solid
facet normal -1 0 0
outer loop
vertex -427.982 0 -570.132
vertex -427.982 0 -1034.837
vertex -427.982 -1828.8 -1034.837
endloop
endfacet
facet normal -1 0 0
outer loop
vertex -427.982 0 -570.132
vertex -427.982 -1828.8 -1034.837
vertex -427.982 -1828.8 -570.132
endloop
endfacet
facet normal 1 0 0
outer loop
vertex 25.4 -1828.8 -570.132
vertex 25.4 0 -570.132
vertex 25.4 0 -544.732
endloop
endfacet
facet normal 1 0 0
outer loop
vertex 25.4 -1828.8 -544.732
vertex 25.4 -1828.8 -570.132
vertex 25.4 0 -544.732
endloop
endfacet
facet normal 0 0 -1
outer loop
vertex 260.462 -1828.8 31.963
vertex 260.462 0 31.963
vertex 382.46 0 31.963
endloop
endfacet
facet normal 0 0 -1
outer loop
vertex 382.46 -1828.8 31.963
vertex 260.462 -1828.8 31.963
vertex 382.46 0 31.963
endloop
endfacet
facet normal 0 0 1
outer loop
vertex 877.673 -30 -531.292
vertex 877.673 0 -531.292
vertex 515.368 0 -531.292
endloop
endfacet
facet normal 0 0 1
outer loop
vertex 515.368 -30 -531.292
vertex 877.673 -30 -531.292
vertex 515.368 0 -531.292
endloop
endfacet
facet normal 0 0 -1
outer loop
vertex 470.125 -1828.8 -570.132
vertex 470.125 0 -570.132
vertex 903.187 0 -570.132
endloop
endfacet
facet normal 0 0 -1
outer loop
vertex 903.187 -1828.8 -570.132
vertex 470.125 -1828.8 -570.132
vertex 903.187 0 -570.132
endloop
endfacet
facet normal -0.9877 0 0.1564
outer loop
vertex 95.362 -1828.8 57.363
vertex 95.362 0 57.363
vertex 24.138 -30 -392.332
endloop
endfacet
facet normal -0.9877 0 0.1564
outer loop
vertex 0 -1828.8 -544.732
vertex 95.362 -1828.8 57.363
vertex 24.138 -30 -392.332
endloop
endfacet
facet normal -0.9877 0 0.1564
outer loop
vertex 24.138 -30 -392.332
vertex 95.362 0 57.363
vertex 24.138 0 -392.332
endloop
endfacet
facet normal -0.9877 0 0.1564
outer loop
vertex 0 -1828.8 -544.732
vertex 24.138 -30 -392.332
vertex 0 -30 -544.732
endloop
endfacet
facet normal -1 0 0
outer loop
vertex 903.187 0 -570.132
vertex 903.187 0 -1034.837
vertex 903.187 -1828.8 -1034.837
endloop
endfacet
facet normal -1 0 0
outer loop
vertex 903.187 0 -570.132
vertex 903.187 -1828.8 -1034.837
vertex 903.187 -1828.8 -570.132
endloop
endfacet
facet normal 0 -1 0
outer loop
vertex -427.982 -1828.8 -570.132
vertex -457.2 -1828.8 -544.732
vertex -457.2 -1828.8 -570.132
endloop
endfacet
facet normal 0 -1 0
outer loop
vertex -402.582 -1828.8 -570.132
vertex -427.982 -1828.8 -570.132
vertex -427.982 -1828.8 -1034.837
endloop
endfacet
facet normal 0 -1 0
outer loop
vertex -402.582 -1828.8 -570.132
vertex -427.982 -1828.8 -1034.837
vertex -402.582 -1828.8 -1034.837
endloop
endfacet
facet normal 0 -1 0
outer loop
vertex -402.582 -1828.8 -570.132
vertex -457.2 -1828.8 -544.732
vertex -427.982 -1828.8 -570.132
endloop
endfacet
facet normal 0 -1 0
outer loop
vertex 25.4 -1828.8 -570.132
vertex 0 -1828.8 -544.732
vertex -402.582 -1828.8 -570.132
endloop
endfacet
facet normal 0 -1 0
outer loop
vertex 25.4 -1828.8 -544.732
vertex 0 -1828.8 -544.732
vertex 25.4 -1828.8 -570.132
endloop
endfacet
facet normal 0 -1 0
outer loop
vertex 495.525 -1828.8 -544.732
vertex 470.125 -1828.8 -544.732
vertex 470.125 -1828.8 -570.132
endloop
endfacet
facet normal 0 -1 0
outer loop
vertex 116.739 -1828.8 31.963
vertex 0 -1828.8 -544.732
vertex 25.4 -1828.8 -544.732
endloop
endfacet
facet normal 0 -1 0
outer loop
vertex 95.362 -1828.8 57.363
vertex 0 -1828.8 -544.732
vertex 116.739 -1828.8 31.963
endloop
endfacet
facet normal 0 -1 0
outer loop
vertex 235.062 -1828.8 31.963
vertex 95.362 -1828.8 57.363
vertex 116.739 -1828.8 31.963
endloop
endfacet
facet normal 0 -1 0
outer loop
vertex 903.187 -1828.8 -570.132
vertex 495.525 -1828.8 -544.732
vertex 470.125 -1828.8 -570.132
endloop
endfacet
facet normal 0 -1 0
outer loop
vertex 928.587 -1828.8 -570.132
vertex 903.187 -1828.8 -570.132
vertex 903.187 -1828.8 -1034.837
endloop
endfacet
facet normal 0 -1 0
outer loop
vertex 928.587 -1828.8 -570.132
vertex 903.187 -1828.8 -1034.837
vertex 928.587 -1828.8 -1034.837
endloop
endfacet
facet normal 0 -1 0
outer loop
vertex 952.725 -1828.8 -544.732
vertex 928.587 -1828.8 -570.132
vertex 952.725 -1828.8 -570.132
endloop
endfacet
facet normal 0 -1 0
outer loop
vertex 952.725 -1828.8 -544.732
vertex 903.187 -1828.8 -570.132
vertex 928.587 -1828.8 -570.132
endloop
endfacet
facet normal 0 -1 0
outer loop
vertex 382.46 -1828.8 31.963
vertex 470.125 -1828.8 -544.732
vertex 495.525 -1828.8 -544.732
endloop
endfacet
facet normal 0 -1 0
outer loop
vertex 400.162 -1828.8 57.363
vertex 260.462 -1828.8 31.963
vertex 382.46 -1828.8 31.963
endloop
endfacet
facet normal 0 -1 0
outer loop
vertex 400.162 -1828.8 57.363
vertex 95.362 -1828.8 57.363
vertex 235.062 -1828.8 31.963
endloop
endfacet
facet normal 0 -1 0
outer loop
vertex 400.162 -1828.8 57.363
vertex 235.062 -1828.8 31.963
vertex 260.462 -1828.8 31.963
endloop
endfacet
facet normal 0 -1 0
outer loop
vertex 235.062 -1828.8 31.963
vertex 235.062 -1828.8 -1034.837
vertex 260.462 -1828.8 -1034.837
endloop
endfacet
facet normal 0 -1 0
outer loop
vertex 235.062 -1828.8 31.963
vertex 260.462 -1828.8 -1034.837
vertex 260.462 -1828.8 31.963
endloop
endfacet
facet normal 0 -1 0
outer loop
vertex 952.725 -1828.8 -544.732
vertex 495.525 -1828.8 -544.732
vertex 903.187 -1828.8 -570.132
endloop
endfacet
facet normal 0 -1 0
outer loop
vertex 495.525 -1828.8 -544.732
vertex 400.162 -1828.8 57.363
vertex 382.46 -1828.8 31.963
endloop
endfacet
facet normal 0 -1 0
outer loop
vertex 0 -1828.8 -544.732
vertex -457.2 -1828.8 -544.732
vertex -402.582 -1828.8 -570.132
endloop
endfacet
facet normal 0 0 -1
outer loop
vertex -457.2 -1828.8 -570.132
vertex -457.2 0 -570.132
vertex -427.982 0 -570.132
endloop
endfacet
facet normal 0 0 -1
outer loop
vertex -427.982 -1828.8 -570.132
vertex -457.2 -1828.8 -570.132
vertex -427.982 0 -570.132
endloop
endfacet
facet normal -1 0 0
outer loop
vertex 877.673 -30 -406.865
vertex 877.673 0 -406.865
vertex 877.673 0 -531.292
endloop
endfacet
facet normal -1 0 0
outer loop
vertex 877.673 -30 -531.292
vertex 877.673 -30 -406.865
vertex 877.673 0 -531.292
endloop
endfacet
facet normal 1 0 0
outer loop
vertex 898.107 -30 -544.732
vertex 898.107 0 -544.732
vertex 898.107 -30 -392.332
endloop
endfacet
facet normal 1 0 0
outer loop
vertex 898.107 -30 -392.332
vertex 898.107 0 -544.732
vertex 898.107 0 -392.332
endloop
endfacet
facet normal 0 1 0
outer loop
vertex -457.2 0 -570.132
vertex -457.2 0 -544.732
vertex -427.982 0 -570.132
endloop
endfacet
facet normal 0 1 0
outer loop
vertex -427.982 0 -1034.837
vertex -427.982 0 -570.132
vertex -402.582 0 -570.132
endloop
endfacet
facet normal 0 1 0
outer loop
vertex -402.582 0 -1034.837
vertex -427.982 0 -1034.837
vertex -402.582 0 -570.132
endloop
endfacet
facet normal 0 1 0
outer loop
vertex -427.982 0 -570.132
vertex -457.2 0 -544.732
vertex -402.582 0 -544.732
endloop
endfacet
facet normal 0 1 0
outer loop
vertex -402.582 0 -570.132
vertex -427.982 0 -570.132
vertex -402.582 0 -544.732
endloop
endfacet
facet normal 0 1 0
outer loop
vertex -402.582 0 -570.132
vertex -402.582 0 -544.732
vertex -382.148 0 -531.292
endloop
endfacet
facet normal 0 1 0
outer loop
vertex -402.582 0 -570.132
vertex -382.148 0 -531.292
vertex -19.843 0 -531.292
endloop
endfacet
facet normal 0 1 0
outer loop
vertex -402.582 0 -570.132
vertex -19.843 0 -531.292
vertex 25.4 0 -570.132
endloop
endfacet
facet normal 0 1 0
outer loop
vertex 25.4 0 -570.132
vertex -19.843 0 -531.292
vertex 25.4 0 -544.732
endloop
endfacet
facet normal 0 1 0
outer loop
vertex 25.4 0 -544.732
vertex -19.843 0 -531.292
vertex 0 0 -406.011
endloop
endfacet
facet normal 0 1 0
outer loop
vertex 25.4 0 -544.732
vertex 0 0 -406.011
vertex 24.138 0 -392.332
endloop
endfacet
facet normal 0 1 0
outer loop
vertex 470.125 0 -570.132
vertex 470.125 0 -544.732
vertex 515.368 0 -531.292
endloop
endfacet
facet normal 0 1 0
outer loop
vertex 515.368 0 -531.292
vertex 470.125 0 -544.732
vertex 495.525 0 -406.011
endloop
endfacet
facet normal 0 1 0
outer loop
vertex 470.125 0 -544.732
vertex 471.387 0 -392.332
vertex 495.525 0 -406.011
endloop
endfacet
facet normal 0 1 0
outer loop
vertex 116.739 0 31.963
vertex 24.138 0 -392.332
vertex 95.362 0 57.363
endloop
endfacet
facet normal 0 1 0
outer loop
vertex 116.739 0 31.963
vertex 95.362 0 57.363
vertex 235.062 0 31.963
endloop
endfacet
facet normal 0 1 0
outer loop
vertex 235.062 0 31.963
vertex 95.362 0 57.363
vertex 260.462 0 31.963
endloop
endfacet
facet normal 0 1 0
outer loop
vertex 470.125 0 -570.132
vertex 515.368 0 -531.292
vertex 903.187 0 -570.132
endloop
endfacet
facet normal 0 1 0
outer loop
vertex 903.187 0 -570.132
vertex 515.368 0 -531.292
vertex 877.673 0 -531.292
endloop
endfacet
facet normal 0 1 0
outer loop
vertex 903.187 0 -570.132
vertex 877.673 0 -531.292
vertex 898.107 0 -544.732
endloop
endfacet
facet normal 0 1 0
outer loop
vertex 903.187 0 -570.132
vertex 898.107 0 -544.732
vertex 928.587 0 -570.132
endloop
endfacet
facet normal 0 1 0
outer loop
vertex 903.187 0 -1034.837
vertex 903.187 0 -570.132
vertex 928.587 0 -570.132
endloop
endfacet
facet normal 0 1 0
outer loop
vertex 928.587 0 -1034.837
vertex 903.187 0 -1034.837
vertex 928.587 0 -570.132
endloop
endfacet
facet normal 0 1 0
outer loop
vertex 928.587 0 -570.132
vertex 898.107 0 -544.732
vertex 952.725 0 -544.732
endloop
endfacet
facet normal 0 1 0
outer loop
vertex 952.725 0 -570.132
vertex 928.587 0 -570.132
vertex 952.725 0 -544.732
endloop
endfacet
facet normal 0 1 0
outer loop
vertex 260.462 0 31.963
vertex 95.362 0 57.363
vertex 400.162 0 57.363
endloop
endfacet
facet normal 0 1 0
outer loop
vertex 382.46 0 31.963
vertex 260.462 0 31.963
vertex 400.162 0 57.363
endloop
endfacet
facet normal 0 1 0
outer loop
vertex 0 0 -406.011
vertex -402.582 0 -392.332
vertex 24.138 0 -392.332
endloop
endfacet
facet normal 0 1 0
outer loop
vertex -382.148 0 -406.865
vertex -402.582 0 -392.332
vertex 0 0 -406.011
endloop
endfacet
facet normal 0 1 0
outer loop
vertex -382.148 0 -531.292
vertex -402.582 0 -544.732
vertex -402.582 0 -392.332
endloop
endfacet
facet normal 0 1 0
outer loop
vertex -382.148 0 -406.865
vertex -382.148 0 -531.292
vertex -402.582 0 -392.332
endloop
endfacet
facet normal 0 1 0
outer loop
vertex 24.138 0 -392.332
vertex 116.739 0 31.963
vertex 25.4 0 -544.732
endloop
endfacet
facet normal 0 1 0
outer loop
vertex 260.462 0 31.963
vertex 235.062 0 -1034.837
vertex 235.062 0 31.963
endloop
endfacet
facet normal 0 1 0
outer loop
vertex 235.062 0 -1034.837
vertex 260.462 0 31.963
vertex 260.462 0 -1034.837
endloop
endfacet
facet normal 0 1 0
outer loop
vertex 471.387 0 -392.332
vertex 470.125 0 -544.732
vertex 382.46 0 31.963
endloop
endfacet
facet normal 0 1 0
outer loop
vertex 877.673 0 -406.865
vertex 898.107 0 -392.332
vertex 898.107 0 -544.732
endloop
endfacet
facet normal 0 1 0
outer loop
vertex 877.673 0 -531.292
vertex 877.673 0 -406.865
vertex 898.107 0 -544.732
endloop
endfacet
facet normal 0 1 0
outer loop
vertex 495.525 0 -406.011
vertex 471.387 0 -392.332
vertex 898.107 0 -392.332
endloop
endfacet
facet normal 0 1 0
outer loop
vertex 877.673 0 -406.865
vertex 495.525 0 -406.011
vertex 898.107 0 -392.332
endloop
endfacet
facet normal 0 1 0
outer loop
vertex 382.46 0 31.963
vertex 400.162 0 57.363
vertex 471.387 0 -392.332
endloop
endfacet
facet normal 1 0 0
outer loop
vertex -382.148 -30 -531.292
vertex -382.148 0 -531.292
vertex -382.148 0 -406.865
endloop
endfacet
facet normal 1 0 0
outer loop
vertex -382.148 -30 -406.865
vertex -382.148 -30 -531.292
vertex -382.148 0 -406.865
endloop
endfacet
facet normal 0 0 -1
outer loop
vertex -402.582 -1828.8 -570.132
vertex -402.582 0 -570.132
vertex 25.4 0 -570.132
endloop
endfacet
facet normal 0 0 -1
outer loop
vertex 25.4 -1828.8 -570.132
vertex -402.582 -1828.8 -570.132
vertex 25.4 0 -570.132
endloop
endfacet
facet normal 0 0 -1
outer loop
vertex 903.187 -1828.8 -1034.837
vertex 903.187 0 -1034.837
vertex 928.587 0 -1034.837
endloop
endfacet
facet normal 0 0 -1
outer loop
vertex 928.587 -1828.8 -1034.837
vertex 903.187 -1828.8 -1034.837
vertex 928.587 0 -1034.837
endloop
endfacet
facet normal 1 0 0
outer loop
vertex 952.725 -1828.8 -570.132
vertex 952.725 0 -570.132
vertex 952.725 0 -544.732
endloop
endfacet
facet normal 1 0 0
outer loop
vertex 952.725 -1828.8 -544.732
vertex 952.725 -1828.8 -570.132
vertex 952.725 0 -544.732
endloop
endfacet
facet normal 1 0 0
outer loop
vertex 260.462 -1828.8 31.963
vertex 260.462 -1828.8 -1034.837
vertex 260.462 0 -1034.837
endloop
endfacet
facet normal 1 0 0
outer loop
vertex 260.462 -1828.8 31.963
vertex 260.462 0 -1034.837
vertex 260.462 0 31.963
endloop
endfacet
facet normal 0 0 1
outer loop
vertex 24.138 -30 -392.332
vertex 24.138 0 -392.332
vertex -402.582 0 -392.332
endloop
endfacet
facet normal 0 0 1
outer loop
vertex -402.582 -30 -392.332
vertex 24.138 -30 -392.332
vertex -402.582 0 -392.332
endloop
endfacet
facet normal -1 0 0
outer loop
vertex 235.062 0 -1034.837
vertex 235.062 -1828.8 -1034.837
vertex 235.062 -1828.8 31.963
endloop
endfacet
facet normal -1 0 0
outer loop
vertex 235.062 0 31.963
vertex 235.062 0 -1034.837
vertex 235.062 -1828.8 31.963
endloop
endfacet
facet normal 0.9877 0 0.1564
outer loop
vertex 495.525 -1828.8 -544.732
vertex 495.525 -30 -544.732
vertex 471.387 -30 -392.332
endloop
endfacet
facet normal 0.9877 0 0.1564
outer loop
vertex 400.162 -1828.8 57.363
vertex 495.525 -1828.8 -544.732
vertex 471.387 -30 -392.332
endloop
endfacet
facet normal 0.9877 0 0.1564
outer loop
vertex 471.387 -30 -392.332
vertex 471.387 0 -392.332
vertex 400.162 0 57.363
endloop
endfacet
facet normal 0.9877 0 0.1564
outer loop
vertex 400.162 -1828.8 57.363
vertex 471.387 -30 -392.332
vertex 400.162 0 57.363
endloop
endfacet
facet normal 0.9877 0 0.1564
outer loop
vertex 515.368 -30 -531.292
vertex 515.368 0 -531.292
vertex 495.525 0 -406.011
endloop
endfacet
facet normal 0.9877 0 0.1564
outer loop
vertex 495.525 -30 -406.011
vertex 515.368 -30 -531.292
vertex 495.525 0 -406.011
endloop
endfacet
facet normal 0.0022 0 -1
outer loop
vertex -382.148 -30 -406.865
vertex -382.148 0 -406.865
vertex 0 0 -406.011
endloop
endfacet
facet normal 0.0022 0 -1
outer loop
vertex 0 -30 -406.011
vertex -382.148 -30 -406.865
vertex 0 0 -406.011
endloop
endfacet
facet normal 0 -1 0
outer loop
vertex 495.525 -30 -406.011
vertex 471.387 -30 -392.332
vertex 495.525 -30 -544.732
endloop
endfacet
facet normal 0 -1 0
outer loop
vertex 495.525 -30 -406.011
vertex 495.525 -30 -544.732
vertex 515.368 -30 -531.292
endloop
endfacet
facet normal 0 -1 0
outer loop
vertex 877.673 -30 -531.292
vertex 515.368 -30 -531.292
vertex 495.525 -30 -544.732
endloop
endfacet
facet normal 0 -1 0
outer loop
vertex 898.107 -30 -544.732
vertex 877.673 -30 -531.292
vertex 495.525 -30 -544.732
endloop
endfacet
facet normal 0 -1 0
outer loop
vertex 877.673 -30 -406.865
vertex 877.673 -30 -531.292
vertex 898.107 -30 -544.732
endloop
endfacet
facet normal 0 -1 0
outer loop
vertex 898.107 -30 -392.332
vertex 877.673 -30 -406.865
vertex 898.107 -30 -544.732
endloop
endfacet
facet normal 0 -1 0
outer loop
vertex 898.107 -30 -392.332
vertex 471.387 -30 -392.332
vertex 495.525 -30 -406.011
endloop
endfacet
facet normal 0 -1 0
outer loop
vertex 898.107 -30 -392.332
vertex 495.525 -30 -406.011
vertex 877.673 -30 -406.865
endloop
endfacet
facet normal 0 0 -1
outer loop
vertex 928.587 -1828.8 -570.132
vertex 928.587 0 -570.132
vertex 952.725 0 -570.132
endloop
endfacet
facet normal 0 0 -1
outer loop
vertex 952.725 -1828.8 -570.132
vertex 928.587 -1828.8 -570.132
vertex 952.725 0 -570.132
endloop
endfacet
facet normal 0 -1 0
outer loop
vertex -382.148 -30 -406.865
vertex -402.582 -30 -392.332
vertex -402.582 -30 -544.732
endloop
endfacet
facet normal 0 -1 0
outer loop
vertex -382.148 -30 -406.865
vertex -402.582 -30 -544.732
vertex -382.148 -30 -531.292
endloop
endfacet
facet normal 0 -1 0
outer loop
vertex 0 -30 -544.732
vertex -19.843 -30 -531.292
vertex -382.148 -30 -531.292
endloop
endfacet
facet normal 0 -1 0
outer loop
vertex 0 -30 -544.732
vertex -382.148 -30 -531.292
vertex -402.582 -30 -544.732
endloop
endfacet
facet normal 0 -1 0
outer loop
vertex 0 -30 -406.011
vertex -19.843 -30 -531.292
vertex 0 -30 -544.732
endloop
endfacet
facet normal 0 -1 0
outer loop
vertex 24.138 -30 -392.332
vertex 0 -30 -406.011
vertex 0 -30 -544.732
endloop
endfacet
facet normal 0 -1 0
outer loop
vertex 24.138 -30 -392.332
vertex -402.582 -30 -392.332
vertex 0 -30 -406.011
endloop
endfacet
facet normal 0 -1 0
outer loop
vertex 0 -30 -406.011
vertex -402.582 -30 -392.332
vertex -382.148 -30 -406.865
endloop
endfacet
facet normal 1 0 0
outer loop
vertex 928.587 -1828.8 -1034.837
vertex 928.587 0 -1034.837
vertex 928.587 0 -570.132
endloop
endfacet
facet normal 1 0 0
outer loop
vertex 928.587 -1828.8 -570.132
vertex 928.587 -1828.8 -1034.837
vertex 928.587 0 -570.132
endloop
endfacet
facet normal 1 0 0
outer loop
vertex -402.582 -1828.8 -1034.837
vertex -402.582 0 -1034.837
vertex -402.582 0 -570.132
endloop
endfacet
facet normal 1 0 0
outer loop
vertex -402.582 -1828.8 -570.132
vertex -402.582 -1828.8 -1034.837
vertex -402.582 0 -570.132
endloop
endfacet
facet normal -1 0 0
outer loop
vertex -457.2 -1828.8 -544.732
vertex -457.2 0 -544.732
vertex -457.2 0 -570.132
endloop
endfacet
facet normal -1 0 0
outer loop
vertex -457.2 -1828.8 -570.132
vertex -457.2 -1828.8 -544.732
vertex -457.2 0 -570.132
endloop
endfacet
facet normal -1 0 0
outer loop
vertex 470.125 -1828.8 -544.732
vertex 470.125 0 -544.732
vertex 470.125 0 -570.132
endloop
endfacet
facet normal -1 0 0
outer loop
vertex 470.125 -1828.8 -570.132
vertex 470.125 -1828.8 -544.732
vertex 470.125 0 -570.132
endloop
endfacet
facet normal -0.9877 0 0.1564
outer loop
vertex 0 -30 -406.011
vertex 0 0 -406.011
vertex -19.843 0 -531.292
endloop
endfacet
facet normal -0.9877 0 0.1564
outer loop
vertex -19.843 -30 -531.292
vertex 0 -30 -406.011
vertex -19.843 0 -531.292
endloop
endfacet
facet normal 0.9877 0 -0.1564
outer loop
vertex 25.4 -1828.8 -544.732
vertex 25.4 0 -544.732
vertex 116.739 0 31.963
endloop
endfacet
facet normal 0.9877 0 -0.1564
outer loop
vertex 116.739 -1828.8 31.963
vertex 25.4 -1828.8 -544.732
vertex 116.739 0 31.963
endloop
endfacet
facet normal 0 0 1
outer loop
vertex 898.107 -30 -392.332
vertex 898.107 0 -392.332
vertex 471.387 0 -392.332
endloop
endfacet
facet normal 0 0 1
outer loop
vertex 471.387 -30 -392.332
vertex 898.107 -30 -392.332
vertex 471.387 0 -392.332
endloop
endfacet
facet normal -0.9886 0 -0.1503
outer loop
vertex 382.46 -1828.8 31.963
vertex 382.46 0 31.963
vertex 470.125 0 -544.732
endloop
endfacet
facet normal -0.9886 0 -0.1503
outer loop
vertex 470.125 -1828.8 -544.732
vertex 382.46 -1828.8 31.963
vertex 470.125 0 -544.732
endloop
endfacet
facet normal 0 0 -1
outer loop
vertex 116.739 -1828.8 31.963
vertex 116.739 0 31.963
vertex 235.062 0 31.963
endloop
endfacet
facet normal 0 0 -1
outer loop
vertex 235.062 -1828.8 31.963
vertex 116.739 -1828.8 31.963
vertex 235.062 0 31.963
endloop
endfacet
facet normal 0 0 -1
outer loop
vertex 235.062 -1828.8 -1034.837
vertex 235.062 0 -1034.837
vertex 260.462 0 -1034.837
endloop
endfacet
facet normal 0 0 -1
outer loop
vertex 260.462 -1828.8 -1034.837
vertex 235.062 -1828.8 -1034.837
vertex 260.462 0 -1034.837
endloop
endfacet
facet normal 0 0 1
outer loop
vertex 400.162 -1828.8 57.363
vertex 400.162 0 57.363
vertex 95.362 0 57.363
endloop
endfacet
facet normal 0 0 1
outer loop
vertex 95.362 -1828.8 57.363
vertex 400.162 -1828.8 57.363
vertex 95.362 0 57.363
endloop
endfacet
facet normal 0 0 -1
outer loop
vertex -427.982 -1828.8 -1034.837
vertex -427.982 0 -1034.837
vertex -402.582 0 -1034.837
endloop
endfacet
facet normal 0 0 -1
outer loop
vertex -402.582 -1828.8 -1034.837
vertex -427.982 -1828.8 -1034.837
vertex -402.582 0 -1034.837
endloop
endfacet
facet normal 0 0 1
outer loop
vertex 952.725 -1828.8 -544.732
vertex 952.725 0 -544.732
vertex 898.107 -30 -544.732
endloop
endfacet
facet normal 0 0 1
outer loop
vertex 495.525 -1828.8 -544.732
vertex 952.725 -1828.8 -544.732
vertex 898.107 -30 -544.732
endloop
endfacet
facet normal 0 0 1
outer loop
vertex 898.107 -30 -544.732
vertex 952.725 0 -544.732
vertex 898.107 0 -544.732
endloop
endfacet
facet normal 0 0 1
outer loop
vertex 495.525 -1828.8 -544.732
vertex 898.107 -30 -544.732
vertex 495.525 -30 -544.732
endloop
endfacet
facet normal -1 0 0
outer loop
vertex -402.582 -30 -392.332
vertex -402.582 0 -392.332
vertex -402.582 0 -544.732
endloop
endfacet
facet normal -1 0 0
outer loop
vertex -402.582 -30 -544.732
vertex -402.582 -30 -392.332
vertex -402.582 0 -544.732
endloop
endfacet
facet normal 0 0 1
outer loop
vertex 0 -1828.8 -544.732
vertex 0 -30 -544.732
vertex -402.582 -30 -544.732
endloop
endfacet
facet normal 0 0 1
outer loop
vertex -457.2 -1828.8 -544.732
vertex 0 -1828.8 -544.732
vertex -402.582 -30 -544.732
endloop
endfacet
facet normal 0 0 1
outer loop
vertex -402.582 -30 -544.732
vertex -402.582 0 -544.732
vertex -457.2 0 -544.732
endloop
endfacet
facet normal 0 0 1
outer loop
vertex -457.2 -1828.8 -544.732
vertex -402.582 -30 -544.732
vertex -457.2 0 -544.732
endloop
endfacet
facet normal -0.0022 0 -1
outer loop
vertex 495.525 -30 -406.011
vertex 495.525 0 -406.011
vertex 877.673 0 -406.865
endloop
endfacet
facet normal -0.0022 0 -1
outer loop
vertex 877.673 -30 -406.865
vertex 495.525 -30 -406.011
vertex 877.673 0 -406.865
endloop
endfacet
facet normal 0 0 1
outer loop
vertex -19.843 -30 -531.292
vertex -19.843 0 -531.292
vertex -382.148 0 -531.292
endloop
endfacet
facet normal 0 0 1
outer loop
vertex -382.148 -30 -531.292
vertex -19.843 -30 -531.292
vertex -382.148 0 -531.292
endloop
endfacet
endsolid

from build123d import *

# Parameters (mm, degrees)
F0_W     = 25.4
F0_H     = 464.7051875732
F0_H_2   = 1066.8
F0_H_3   = 25.4
F1_DEPTH = 1828.8
F2_DEPTH = 30


# Not quite as in the source:
# - a feature names something its author has since deleted; it is built from what else it names


with BuildPart() as f1:
    # F0 (on Front) → F1 (new body)
    with BuildSketch(Plane.XZ):
        with Locations((-415.2822112945, -802.4841870543)):
            Rectangle(F0_W, F0_H)
        with Locations((247.7624498885, -501.4367808409)):
            Rectangle(F0_W, F0_H_2)
        with Locations((915.8871110716, -802.4841870543)):
            Rectangle(F0_W, F0_H)
        with Locations((12.7, -557.4315932677)):
            Rectangle(F0_W, F0_H_3)
        Polygon((145.9203362465, 57.3632191591), (95.3624498885, 57.3632191591), (24.1377887055, -392.3315932677), (0, -544.7315932677), (25.4, -544.7315932677), (116.7394851043, 31.9632191591), (145.9203362465, 31.9632191591), align=None)
        Polygon((362.7394139767, 57.3632191591), (145.9203362465, 57.3632191591), (145.9203362465, 31.9632191591), (235.0624498885, 31.9632191591), (260.4624498885, 31.9632191591), (362.7394139767, 31.9632191591), align=None)
        Polygon((898.1071110716, -544.7315932677), (495.524899777, -544.7315932677), (470.124899777, -544.7315932677), (470.124899777, -570.1315932677), (903.1871110716, -570.1315932677), (928.5871110716, -570.1315932677), (952.7248997771, -570.1315932677), (952.724899777, -544.7315932677), align=None)
        Polygon((400.1624498885, 57.3632191591), (362.7394139767, 57.3632191591), (362.7394139767, 31.9632191591), (382.4598755032, 31.9632191591), (470.124899777, -544.7315932677), (495.524899777, -544.7315932677), (471.3871110716, -392.3315932677), align=None)
        Polygon((0, -570.1315932677), (0, -544.7315932677), (-402.5822112945, -544.7315932677), (-457.2, -544.7315932677), (-457.2, -570.1315932677), (-427.9822112945, -570.1315932677), (-402.5822112945, -570.1315932677), align=None)
    extrude(amount=F1_DEPTH)

    # F0 (on Front) → F2 (join)
    with BuildSketch(Plane.XZ):
        Polygon((0, -544.7315932677), (24.1377887055, -392.3315932677), (-402.5822112945, -392.3315932677), (-402.5822112945, -544.7315932677), align=None)
        Polygon((-382.1481764317, -406.8649113178), (0, -406.0111343861), (-19.8426051641, -531.2924127962), (-382.1481764317, -531.2924127962), align=None, mode=Mode.SUBTRACT)
        Polygon((898.1071110716, -392.3315932677), (471.3871110716, -392.3315932677), (495.524899777, -544.7315932677), (898.1071110716, -544.7315932677), align=None)
        Polygon((495.524899777, -406.0111343861), (877.6730762087, -406.8649113178), (877.6730762087, -531.2924127962), (515.3675049412, -531.2924127962), align=None, mode=Mode.SUBTRACT)
    extrude(amount=F2_DEPTH)


solid = f1.part
